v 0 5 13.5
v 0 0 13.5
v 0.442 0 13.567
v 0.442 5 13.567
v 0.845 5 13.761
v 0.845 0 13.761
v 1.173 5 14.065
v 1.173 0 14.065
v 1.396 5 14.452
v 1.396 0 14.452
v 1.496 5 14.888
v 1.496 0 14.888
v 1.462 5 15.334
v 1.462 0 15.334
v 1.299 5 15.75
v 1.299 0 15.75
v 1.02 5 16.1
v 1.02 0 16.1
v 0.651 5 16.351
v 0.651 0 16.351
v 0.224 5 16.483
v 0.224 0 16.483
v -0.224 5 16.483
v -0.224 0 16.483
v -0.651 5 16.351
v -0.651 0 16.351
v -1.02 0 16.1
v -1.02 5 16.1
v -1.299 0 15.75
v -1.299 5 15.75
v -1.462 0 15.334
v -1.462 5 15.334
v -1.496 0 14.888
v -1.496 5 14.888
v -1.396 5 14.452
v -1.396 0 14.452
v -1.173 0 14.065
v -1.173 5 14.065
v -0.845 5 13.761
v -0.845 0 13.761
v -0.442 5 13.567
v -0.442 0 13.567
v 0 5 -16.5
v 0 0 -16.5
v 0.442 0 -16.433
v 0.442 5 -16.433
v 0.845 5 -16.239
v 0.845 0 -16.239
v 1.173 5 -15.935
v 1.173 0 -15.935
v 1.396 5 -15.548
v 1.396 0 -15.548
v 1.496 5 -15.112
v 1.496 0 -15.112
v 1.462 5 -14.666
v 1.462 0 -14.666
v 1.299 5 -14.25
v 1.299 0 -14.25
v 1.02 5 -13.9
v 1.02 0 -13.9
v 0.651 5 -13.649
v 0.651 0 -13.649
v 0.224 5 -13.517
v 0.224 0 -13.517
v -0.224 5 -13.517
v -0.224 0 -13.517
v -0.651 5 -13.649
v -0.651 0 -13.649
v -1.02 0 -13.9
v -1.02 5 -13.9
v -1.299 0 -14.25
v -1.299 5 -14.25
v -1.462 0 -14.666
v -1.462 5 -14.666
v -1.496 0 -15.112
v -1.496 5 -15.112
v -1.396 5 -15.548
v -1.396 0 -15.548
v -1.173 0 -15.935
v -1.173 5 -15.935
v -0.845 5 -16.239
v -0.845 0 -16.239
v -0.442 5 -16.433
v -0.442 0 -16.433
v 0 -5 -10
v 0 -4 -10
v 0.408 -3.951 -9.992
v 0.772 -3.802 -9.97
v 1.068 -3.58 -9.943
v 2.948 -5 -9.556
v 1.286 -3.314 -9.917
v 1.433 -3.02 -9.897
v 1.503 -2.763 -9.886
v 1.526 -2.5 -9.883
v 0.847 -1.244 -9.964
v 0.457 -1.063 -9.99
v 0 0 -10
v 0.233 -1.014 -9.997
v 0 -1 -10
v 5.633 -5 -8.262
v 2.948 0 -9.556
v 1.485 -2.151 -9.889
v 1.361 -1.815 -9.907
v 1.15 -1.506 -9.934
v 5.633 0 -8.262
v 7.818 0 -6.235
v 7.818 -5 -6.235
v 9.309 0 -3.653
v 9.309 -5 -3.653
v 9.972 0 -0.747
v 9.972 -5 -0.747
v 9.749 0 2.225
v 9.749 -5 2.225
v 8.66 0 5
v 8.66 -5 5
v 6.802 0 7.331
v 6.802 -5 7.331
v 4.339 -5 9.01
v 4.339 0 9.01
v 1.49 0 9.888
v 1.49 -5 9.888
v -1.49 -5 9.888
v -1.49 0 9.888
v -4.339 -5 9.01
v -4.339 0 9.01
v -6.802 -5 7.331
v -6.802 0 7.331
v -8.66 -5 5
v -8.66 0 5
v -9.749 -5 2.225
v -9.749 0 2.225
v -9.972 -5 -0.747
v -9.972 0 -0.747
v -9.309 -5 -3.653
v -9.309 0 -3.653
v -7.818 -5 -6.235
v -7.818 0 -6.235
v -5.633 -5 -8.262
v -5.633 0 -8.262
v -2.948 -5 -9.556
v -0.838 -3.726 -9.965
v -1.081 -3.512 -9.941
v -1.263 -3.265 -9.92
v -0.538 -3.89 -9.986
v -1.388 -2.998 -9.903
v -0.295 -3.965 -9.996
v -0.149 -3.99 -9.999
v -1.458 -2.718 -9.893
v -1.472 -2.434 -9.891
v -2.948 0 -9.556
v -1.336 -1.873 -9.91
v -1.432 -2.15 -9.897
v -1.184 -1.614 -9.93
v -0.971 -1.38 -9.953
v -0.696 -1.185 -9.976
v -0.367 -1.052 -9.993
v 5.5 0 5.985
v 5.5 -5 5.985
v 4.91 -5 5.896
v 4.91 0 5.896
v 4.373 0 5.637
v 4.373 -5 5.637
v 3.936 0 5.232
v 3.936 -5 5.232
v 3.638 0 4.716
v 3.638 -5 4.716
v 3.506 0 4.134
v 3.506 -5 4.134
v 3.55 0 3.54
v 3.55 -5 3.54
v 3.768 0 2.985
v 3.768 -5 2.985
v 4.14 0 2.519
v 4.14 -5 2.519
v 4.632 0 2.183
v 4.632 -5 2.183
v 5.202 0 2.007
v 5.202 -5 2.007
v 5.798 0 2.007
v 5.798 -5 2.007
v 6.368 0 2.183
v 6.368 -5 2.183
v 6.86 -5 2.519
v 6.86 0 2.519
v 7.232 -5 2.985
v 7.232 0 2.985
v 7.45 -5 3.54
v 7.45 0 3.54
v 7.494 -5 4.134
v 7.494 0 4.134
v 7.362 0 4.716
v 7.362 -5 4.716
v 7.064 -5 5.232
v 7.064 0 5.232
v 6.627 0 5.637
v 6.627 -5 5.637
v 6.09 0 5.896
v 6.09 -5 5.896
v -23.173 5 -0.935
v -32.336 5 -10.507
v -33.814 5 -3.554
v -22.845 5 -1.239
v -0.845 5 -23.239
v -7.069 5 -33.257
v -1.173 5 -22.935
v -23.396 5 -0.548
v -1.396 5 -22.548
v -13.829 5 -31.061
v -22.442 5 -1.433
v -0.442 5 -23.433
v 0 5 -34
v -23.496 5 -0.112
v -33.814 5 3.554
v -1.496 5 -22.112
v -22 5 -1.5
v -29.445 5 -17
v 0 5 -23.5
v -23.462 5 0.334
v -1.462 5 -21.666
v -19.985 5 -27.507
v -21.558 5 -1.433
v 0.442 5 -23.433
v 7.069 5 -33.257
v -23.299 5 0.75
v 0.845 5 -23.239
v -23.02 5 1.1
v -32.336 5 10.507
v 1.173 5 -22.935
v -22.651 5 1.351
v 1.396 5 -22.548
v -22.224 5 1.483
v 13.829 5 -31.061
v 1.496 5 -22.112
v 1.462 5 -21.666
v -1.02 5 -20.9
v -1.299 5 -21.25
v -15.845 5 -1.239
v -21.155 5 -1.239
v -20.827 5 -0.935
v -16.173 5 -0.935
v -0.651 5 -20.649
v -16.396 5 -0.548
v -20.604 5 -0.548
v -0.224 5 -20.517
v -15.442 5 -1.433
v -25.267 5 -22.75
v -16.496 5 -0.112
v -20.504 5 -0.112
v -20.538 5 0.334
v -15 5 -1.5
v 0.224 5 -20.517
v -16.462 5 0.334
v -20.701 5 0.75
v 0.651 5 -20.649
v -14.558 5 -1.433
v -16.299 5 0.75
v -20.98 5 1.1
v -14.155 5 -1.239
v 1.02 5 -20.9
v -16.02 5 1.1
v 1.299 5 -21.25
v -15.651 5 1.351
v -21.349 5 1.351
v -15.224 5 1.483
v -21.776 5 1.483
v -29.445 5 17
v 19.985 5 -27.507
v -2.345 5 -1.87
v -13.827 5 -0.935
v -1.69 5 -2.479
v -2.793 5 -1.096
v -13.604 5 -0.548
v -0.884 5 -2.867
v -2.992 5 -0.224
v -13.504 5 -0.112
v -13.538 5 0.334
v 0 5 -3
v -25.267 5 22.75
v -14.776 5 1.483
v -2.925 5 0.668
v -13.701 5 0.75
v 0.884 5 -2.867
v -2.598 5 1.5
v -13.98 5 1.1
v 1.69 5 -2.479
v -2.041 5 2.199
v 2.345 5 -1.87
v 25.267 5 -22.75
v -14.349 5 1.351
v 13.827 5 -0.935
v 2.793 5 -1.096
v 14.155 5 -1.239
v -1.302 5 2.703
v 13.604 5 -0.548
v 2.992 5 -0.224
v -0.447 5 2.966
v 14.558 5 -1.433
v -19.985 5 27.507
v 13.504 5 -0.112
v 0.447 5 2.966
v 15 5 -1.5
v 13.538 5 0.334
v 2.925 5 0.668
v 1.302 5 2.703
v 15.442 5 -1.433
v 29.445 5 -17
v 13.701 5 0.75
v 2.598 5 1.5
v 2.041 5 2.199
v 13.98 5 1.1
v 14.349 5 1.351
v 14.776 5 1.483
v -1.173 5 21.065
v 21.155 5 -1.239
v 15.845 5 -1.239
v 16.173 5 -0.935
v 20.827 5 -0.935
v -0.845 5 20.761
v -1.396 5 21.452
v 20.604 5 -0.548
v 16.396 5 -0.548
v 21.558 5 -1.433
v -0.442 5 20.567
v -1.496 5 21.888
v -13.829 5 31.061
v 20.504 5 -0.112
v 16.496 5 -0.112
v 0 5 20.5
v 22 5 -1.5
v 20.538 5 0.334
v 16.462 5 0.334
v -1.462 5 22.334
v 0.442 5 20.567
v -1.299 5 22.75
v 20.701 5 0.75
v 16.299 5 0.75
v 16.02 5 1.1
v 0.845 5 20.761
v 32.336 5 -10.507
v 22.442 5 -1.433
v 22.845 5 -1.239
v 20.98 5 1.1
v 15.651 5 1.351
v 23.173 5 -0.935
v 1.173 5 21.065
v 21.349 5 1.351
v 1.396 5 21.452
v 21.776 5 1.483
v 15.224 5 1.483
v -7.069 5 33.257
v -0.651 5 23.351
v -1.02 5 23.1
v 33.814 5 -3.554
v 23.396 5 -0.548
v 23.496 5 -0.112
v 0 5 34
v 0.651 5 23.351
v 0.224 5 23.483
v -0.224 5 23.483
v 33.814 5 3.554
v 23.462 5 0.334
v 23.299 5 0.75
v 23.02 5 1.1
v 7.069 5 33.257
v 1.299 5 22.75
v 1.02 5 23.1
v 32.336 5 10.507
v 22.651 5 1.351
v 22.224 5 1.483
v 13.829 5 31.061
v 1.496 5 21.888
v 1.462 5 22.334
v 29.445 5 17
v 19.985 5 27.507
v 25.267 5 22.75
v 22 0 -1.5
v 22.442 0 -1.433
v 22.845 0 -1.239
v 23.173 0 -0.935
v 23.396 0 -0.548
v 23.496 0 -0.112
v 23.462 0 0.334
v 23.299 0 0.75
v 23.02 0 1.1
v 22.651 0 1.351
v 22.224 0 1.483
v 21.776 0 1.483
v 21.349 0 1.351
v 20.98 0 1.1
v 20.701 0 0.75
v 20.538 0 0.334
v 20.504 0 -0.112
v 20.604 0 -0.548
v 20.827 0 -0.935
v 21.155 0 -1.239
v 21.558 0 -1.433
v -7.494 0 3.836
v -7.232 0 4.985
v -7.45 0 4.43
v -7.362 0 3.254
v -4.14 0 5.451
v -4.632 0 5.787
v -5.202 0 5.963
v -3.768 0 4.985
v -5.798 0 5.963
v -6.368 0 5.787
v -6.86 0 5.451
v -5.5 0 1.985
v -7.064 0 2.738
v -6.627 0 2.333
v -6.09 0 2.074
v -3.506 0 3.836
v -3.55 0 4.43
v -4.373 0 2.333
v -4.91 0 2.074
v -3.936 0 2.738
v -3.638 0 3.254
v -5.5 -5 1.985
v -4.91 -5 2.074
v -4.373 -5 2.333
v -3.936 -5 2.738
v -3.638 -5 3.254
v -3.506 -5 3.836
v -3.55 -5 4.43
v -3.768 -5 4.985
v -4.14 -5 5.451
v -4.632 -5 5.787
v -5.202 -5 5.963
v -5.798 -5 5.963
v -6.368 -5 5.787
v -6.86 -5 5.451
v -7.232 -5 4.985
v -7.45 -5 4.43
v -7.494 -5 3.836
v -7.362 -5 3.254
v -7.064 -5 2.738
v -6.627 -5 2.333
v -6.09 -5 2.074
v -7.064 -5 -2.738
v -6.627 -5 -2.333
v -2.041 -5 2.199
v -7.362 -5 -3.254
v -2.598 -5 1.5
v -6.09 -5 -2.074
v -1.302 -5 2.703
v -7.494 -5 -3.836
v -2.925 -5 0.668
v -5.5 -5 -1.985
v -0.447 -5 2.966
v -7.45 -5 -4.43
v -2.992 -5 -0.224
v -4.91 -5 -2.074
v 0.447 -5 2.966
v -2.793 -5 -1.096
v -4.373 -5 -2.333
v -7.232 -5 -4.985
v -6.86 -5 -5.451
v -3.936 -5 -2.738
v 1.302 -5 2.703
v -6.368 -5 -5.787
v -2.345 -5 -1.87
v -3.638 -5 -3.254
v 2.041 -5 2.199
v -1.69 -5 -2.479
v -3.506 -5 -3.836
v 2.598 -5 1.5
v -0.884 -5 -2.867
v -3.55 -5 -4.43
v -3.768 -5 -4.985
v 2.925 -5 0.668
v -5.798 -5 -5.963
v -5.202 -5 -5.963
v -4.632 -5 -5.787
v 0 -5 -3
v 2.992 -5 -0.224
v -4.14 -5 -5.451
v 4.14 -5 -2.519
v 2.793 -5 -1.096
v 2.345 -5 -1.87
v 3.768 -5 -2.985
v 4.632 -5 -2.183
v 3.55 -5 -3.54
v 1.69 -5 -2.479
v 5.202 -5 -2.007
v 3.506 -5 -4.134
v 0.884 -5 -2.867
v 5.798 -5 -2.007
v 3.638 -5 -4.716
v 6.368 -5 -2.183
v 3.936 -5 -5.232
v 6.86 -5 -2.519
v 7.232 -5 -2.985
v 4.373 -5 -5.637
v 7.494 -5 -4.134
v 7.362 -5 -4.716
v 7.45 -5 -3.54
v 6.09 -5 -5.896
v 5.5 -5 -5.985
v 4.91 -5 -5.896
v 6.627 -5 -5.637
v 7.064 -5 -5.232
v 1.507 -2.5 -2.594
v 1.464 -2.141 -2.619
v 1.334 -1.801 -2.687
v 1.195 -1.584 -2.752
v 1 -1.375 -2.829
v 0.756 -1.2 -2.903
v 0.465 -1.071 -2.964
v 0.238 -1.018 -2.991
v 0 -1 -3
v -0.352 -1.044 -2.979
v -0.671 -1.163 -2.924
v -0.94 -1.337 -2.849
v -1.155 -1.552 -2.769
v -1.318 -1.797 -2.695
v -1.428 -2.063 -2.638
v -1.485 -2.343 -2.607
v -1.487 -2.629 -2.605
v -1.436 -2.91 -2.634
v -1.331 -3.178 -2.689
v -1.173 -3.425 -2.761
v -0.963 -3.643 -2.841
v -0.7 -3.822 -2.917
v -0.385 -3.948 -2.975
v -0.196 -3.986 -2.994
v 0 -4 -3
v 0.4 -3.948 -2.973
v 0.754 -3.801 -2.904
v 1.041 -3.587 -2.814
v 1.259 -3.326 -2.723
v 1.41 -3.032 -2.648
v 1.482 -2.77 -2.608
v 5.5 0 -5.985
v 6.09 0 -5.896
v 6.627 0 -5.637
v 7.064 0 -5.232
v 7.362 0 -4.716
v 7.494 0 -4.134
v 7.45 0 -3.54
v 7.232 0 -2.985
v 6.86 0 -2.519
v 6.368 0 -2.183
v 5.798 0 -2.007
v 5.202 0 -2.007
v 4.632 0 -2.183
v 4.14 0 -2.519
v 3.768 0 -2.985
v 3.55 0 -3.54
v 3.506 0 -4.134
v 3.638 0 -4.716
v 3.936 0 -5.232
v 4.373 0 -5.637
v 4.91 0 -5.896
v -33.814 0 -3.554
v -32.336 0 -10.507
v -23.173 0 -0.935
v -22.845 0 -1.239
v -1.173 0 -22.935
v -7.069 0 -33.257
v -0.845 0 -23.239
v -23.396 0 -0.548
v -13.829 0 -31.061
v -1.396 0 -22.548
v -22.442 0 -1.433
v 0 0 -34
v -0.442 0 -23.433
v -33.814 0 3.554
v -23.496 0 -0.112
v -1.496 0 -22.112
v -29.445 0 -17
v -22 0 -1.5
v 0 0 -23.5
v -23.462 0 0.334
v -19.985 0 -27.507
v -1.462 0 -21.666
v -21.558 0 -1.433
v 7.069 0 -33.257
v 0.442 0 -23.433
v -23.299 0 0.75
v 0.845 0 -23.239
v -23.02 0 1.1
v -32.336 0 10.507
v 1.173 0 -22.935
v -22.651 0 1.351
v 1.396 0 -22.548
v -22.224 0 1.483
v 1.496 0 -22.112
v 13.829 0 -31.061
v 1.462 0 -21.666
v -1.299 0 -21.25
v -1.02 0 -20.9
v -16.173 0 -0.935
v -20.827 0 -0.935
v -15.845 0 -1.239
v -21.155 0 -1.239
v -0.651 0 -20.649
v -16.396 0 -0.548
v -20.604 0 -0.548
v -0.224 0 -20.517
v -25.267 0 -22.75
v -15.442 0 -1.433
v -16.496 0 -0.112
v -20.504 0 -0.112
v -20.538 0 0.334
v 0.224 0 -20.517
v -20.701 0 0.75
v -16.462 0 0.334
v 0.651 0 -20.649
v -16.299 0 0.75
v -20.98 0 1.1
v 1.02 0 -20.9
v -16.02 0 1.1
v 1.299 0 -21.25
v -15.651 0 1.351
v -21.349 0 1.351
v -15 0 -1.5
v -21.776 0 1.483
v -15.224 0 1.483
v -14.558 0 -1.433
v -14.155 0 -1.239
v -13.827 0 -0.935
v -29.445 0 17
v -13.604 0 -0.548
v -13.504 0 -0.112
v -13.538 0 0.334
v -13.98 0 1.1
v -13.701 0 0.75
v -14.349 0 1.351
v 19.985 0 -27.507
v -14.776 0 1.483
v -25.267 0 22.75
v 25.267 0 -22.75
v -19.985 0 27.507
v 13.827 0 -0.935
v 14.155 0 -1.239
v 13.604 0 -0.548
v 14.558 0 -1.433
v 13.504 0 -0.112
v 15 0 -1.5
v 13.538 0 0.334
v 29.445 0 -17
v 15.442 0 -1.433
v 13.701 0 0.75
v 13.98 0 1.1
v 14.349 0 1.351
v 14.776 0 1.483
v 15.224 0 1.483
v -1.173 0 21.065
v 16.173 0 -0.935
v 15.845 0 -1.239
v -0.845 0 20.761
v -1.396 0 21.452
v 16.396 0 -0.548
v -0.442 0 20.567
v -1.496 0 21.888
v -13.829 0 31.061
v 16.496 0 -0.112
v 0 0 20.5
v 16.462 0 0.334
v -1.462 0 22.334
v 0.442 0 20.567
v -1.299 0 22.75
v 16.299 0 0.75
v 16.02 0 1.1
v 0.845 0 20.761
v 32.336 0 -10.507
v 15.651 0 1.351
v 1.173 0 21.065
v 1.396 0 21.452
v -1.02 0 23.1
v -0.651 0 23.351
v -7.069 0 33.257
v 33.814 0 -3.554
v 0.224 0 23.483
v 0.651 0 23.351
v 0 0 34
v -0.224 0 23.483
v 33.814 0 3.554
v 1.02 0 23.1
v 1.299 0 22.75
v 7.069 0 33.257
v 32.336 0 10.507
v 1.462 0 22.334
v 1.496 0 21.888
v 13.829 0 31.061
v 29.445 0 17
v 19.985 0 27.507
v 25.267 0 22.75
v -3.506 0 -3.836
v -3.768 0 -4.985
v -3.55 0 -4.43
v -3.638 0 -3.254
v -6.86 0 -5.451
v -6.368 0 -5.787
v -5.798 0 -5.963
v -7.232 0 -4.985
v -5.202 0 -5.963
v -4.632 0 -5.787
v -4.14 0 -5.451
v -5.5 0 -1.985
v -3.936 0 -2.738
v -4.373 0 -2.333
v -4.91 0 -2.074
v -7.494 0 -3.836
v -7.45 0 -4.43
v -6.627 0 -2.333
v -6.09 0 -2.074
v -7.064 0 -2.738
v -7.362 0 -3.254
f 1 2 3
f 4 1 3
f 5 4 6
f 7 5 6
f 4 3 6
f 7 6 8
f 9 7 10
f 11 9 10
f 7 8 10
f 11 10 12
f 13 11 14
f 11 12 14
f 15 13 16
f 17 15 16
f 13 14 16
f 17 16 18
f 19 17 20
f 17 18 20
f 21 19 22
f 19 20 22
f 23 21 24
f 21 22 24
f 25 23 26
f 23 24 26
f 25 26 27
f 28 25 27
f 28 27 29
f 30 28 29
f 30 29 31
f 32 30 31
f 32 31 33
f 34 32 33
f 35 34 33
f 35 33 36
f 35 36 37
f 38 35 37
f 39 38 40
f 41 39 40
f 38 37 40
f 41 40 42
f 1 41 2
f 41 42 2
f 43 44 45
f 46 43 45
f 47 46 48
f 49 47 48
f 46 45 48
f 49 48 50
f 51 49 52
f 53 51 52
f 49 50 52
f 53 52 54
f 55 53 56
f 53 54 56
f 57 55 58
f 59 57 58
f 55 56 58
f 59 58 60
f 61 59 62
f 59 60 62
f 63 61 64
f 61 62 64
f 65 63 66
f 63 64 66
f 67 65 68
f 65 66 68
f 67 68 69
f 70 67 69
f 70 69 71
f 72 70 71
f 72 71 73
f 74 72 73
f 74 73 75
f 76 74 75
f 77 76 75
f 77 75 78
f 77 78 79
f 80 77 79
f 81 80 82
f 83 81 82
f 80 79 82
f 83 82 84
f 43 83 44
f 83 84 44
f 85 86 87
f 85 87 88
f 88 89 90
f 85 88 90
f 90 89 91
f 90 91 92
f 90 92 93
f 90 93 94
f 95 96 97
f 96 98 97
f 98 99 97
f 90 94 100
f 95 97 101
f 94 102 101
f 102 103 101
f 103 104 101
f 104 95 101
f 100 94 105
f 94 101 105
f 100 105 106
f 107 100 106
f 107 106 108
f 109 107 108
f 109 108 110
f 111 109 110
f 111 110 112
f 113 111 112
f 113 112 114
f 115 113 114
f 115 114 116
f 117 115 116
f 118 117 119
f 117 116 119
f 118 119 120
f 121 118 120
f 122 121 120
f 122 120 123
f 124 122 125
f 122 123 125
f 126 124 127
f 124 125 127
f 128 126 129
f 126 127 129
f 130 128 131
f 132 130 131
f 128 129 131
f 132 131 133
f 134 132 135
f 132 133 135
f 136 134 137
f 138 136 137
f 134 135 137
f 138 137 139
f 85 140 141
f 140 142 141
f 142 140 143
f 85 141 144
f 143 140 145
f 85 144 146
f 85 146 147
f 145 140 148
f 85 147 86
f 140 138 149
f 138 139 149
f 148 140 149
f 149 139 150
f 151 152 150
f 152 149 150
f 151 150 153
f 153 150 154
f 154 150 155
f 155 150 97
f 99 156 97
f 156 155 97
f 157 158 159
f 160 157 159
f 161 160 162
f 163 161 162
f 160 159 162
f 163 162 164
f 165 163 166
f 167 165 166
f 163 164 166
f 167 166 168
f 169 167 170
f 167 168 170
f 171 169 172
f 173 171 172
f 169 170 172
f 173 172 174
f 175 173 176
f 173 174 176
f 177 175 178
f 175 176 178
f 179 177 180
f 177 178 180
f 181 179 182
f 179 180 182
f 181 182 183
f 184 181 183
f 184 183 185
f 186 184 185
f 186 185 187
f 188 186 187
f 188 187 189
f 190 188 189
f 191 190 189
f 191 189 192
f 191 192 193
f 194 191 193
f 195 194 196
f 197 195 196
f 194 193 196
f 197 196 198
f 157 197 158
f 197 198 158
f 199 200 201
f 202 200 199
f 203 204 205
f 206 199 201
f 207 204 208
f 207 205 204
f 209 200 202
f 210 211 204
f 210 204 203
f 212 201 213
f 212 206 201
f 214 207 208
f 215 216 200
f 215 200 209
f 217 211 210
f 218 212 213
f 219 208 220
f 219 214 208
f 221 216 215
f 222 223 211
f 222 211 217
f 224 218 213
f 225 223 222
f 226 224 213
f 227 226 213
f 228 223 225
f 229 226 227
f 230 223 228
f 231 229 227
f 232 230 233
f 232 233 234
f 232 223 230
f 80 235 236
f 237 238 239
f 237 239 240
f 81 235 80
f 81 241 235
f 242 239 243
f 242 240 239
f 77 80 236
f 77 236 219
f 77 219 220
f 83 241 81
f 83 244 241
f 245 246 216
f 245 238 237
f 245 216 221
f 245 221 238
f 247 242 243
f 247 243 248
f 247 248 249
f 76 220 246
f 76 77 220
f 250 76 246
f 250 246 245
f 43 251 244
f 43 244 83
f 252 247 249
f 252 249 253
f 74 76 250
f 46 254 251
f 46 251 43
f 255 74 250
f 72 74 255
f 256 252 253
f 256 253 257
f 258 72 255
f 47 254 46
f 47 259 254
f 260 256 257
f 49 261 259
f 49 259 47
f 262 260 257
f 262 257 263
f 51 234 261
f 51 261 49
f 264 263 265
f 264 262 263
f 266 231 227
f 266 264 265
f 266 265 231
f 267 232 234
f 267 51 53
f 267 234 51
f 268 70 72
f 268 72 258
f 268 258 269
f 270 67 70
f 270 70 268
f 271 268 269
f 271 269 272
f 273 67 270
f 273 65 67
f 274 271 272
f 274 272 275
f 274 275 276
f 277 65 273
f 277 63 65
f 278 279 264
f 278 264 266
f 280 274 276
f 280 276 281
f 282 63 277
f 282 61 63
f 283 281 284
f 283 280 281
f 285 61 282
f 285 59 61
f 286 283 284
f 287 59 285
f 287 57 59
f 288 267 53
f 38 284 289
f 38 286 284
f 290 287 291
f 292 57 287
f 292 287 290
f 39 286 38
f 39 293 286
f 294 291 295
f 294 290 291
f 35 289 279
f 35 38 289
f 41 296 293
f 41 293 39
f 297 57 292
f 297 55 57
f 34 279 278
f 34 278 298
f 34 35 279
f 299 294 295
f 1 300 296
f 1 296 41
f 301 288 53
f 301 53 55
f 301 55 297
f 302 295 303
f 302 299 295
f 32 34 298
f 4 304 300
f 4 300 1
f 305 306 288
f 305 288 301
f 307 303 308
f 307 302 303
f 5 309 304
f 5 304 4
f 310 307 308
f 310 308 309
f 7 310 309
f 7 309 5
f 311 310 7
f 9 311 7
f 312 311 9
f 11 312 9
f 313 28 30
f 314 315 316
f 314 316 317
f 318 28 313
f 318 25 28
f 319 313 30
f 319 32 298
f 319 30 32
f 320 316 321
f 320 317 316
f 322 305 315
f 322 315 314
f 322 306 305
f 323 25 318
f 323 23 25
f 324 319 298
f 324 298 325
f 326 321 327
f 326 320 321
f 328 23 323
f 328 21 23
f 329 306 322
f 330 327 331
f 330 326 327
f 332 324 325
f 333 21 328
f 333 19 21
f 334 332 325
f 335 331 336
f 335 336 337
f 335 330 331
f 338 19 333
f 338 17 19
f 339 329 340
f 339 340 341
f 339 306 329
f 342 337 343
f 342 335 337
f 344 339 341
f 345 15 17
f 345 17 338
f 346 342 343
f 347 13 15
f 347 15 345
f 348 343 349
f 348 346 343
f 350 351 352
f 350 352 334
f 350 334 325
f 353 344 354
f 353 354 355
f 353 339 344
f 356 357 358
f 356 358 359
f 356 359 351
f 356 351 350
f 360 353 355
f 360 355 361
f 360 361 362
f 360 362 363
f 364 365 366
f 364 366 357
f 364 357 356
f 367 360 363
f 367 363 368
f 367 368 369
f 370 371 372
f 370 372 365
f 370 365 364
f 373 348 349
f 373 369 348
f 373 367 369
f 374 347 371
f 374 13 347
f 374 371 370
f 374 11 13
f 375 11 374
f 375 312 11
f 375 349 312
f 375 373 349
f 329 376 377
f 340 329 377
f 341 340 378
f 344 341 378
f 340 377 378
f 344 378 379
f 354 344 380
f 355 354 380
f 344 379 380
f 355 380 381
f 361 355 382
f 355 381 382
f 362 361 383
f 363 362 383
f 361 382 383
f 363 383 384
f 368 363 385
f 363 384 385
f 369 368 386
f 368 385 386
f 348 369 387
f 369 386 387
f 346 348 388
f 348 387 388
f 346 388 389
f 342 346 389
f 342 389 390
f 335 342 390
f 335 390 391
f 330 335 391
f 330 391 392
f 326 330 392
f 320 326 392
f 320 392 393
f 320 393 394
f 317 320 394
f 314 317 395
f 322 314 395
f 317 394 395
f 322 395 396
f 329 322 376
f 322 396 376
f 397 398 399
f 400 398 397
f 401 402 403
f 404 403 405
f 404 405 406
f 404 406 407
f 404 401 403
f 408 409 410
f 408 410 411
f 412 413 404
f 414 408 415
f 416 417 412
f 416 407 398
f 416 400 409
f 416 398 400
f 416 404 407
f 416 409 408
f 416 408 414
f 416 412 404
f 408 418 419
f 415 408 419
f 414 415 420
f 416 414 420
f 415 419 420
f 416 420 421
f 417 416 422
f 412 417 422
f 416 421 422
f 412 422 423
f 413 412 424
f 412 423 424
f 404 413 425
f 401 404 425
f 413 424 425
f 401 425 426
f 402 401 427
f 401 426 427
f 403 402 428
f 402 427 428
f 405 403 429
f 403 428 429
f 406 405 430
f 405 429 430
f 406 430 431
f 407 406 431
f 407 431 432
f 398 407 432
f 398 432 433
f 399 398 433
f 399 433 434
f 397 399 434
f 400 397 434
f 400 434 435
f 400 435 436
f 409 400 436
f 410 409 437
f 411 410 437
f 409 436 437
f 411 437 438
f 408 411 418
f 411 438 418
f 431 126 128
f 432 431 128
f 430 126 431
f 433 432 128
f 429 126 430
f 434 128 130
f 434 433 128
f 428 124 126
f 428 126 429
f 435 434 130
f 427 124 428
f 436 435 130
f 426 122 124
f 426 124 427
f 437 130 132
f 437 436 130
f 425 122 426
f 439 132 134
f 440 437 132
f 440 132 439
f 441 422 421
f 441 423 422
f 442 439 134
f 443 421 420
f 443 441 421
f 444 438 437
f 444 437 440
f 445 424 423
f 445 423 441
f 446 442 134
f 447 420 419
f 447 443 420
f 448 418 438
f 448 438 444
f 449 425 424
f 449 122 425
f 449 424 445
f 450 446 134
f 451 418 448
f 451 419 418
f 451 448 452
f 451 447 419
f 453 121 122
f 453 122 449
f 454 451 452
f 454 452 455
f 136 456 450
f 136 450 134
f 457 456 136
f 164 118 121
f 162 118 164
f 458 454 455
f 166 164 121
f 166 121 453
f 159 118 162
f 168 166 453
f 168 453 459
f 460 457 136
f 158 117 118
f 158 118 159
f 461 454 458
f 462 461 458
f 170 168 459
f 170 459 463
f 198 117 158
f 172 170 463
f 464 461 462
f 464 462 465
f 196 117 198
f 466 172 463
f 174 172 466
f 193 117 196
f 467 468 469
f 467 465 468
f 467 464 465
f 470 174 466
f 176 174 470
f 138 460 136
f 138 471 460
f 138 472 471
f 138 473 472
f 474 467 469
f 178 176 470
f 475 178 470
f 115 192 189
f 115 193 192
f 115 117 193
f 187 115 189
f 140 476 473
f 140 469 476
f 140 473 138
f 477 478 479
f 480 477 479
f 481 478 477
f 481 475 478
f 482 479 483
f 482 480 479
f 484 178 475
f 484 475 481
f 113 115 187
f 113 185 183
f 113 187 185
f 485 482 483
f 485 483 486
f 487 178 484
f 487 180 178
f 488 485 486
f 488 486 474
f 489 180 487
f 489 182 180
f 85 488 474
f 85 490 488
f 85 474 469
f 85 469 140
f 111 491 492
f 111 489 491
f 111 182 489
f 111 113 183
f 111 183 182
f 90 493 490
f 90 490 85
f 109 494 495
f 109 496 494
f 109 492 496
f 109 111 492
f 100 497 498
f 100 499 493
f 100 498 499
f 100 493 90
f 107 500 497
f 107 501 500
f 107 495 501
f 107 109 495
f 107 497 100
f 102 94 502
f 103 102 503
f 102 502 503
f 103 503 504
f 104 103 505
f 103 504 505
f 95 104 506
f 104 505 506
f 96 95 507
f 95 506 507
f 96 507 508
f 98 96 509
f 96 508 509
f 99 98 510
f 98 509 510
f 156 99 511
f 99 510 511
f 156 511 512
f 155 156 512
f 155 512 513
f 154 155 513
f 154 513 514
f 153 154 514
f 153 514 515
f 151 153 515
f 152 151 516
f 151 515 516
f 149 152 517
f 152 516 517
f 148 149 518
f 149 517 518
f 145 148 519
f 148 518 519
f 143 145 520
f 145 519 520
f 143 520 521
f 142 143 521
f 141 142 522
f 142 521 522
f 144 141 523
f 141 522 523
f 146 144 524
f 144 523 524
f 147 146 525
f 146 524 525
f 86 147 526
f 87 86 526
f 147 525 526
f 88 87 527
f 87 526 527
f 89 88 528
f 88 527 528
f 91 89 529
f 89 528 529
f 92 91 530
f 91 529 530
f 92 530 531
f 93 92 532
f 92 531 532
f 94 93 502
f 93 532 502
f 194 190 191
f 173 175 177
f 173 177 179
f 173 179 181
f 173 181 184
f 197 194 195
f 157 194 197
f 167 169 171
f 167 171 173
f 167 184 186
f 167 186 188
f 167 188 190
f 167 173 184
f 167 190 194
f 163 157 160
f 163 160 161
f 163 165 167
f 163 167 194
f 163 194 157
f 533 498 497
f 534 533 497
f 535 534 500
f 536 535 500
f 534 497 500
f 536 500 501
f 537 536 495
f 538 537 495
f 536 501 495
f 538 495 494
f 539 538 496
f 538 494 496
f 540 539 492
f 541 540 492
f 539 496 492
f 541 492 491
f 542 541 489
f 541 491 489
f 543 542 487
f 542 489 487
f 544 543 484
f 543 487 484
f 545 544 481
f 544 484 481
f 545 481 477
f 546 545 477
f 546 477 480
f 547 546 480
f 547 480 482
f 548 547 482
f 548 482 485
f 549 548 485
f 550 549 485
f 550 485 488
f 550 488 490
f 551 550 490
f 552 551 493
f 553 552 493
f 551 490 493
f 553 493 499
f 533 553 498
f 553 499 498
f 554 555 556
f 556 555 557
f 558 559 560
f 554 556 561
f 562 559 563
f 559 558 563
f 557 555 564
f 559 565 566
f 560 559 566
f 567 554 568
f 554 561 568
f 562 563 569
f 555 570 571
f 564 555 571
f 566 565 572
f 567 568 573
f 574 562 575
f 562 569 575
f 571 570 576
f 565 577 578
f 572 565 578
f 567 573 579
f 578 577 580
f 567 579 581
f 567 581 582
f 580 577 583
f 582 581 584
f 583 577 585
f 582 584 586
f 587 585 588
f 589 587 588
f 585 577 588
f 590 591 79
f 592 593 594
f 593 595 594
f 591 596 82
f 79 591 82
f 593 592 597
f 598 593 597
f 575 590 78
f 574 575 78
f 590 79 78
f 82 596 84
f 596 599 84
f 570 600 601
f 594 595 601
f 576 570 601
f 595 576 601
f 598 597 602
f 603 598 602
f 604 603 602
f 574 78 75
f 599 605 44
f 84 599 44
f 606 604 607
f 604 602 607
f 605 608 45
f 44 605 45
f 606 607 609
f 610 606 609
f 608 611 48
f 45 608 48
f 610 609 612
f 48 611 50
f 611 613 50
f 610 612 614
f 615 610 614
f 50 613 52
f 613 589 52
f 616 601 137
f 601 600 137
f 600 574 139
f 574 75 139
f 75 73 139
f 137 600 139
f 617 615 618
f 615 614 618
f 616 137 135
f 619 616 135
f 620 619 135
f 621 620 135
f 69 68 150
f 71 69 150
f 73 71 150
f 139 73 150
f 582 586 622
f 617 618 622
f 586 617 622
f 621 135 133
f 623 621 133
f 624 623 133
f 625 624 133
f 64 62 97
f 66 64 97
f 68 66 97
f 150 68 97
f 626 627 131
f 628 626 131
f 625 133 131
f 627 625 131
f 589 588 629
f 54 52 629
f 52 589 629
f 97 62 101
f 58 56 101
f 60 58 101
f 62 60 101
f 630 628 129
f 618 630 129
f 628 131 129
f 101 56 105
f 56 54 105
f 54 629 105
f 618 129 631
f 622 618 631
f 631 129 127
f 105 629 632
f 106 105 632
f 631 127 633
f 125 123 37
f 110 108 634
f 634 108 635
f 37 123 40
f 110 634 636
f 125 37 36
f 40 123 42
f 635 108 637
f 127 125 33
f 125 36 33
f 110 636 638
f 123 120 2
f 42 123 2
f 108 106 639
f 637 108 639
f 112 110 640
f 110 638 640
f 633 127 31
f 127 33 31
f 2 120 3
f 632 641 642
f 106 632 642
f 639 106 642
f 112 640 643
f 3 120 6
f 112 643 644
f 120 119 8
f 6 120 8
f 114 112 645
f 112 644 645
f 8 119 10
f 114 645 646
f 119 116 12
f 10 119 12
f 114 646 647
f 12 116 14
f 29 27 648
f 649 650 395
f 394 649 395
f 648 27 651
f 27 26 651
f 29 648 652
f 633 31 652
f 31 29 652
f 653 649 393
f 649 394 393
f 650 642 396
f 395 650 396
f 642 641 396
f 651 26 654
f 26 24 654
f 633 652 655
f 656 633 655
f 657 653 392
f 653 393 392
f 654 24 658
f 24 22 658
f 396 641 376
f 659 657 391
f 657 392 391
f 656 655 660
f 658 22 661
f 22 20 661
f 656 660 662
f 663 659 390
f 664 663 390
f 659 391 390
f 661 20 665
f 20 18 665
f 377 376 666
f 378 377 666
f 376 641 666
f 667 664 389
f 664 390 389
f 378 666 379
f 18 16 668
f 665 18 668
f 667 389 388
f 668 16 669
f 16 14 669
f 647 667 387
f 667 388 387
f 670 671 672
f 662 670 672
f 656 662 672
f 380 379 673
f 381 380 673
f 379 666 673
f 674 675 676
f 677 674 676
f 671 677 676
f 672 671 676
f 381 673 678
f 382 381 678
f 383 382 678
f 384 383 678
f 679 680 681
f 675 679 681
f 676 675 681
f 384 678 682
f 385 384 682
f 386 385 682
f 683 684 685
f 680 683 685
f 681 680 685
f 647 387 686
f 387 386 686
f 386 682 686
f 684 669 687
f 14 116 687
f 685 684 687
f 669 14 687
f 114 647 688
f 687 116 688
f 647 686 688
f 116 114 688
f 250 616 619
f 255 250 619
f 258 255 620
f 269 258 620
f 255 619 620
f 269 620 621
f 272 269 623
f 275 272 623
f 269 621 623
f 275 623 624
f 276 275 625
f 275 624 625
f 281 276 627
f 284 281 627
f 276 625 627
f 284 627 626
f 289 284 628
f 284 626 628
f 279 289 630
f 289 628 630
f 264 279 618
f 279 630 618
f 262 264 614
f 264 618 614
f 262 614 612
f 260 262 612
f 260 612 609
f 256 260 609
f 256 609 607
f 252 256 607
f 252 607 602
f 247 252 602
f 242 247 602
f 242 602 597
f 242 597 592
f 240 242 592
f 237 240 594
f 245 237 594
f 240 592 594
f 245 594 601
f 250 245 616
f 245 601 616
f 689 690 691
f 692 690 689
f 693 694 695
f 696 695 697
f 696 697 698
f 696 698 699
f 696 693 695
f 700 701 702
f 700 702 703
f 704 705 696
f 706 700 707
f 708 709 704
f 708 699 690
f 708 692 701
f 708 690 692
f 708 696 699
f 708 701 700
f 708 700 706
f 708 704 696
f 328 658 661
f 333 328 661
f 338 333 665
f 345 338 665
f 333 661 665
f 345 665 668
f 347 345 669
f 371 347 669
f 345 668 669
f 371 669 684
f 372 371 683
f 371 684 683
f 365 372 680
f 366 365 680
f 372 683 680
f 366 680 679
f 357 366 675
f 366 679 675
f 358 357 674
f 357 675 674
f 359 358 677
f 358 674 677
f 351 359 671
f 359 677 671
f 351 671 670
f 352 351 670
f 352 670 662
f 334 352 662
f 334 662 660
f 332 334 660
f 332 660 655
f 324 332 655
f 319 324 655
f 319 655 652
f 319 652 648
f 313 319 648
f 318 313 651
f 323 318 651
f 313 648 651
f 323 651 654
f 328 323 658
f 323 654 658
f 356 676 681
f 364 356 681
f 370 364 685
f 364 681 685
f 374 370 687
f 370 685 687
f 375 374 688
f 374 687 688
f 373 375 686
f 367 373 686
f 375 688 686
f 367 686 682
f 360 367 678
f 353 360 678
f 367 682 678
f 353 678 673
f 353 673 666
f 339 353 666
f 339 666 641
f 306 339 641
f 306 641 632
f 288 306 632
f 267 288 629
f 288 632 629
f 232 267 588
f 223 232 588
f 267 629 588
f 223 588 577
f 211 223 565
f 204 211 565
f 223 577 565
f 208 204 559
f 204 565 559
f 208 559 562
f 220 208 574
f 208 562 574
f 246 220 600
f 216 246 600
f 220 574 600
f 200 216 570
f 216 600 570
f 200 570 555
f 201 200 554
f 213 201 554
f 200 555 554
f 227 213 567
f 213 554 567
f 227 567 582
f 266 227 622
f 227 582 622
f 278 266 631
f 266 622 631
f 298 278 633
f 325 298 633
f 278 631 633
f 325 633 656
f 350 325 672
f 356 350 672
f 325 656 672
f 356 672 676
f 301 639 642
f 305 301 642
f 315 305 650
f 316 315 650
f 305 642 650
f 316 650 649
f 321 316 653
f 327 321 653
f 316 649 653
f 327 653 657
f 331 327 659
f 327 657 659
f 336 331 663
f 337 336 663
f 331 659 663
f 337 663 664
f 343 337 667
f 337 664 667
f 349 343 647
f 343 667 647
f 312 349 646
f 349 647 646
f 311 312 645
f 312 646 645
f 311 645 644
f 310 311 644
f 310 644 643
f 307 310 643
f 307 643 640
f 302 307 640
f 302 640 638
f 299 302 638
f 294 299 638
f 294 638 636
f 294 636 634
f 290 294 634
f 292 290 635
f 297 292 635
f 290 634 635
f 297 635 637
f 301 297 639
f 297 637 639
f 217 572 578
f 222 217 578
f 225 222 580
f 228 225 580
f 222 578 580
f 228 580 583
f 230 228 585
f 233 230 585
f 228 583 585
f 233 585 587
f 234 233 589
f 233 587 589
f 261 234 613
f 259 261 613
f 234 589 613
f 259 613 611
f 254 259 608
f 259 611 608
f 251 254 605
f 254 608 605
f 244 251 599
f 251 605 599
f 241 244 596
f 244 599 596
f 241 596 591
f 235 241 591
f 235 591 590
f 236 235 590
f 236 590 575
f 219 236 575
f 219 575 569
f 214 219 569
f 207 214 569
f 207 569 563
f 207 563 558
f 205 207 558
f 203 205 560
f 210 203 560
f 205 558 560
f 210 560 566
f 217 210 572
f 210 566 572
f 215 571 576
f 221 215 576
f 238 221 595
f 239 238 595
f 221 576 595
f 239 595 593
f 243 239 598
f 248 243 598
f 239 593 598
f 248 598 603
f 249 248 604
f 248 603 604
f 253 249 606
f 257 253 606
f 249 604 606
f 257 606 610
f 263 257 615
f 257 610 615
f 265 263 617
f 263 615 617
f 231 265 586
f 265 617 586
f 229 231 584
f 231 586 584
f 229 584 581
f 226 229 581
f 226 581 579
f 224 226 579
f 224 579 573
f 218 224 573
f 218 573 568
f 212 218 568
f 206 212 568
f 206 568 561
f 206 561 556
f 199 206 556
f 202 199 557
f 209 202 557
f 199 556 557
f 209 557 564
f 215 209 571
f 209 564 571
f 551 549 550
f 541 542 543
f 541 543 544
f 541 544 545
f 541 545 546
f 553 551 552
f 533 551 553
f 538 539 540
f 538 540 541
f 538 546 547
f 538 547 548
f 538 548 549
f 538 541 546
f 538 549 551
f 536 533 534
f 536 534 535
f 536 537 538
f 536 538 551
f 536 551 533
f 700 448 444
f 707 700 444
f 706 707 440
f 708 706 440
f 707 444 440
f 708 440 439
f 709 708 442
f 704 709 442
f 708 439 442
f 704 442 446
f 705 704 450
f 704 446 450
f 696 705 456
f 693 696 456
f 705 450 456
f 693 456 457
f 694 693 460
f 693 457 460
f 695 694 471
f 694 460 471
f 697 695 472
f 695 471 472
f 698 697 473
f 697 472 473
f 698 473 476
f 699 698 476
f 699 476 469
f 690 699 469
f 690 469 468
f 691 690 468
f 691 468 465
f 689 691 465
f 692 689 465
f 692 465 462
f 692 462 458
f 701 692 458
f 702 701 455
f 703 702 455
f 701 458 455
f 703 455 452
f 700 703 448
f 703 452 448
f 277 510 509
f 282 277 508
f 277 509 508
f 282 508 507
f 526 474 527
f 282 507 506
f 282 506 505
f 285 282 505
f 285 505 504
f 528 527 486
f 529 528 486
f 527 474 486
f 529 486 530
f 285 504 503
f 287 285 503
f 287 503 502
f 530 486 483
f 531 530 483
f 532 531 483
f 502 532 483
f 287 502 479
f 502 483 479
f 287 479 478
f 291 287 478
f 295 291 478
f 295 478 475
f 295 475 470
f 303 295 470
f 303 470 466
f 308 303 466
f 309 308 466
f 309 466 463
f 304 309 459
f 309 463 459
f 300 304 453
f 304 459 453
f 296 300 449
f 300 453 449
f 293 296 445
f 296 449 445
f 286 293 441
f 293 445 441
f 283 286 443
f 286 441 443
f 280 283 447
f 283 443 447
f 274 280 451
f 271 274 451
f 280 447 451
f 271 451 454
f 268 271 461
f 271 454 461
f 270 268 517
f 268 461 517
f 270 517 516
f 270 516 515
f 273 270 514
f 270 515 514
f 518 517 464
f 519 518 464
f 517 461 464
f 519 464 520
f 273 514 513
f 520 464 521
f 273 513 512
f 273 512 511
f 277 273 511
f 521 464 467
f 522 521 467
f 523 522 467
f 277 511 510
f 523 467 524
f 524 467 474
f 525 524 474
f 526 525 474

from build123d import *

# Parameters (mm, degrees)
SKETCH2_R                    = 34
BOSS_EXTRUDE1_DEPTH          = 5
SKETCH3_R                    = 1.5
CUT_EXTRUDE1_DEPTH           = 5
SKETCH5_R                    = 1.5
CUT_EXTRUDE2_DEPTH           = 5
SKETCH6_R                    = 10
BOSS_EXTRUDE2_DEPTH          = 5
SKETCH7_R                    = 2
CUT_EXTRUDE3_DEPTH           = 5
SKETCH8_R                    = 3
CUT_EXTRUDE4_DEPTH           = 10
F_3_0_3_DIAMETER_HOLE1_D     = 3
F_3_0_3_DIAMETER_HOLE1_DEPTH = 7.84
F_3_0_3_DIAMETER_HOLE1_TIP   = 0.901290929


with BuildPart() as part:
    # Sketch2 → Boss-Extrude1 (new body)
    with BuildSketch(Plane(origin=(0, 0, 0), x_dir=(1, 0, 0), z_dir=(0, 1, 0))):
        with Locations(Location((0, 0, 0), (0, 0, 270))):
            Circle(SKETCH2_R)
    extrude(amount=BOSS_EXTRUDE1_DEPTH)

    # Sketch3 → Cut-Extrude1 (cut)
    with BuildSketch(Plane.XZ):
        with Locations(Location((0, 22, 0), (0, 0, 270))):
            Circle(SKETCH3_R)
        with Locations(Location((22, 0, 0), (0, 0, 270))):
            Circle(SKETCH3_R)
        with Locations(Location((0, -22, 0), (0, 0, 270))):
            Circle(SKETCH3_R)
        with Locations(Location((-22, 0, 0), (0, 0, 270))):
            Circle(SKETCH3_R)
    extrude(amount=-CUT_EXTRUDE1_DEPTH, mode=Mode.SUBTRACT)

    # Sketch5 → Cut-Extrude2 (cut)
    with BuildSketch(Plane.XZ):
        with Locations(Location((0, 15, 0), (0, 0, 270))):
            Circle(SKETCH5_R)
        with Locations(Location((15, 0, 0), (0, 0, 270))):
            Circle(SKETCH5_R)
        with Locations(Location((0, -15, 0), (0, 0, 270))):
            Circle(SKETCH5_R)
        with Locations(Location((-15, 0, 0), (0, 0, 270))):
            Circle(SKETCH5_R)
    extrude(amount=-CUT_EXTRUDE2_DEPTH, mode=Mode.SUBTRACT)

    # Sketch6 → Boss-Extrude2 (add)
    with BuildSketch(Plane.XZ):
        with Locations(Location((0, 0, 0), (0, 0, 270))):
            Circle(SKETCH6_R)
    extrude(amount=BOSS_EXTRUDE2_DEPTH)

    # Sketch7 → Cut-Extrude3 (cut)
    with BuildSketch(Plane(origin=(0, -5, 0), x_dir=(-1, 0, 0), z_dir=(0, -1, 0))):
        with Locations(Location((5.5, -3.985, 0), (0, 0, 90))):
            Circle(SKETCH7_R)
        with Locations(Location((-5.5, -3.985, 0), (0, 0, 270))):
            Circle(SKETCH7_R)
        with Locations(Location((-5.5, 3.985, 0), (0, 0, 90))):
            Circle(SKETCH7_R)
        with Locations(Location((5.5, 3.985, 0), (0, 0, 270))):
            Circle(SKETCH7_R)
    extrude(amount=-CUT_EXTRUDE3_DEPTH, mode=Mode.SUBTRACT)

    # Sketch8 → Cut-Extrude4 (cut)
    with BuildSketch(Plane.XZ.offset(5)):
        with Locations(Location((0, 0, 0), (0, 0, 270))):
            Circle(SKETCH8_R)
    extrude(amount=-CUT_EXTRUDE4_DEPTH, mode=Mode.SUBTRACT)

    # Ø3.0 (3) Diameter Hole1
    with Locations(Plane(origin=(0.026797027, -2.5, -9.999964096), x_dir=(-0.99999640959, 0, -0.002679702708), z_dir=(0.002679702708, 0, -0.99999640959))):
        with Locations((0, 0)):
            Hole(F_3_0_3_DIAMETER_HOLE1_D / 2, depth=F_3_0_3_DIAMETER_HOLE1_DEPTH)
            with Locations((0, 0, -(F_3_0_3_DIAMETER_HOLE1_DEPTH + F_3_0_3_DIAMETER_HOLE1_TIP / 2))):  # 118° drill point
                Cone(0, F_3_0_3_DIAMETER_HOLE1_D / 2, F_3_0_3_DIAMETER_HOLE1_TIP, mode=Mode.SUBTRACT)


solid = part.part
